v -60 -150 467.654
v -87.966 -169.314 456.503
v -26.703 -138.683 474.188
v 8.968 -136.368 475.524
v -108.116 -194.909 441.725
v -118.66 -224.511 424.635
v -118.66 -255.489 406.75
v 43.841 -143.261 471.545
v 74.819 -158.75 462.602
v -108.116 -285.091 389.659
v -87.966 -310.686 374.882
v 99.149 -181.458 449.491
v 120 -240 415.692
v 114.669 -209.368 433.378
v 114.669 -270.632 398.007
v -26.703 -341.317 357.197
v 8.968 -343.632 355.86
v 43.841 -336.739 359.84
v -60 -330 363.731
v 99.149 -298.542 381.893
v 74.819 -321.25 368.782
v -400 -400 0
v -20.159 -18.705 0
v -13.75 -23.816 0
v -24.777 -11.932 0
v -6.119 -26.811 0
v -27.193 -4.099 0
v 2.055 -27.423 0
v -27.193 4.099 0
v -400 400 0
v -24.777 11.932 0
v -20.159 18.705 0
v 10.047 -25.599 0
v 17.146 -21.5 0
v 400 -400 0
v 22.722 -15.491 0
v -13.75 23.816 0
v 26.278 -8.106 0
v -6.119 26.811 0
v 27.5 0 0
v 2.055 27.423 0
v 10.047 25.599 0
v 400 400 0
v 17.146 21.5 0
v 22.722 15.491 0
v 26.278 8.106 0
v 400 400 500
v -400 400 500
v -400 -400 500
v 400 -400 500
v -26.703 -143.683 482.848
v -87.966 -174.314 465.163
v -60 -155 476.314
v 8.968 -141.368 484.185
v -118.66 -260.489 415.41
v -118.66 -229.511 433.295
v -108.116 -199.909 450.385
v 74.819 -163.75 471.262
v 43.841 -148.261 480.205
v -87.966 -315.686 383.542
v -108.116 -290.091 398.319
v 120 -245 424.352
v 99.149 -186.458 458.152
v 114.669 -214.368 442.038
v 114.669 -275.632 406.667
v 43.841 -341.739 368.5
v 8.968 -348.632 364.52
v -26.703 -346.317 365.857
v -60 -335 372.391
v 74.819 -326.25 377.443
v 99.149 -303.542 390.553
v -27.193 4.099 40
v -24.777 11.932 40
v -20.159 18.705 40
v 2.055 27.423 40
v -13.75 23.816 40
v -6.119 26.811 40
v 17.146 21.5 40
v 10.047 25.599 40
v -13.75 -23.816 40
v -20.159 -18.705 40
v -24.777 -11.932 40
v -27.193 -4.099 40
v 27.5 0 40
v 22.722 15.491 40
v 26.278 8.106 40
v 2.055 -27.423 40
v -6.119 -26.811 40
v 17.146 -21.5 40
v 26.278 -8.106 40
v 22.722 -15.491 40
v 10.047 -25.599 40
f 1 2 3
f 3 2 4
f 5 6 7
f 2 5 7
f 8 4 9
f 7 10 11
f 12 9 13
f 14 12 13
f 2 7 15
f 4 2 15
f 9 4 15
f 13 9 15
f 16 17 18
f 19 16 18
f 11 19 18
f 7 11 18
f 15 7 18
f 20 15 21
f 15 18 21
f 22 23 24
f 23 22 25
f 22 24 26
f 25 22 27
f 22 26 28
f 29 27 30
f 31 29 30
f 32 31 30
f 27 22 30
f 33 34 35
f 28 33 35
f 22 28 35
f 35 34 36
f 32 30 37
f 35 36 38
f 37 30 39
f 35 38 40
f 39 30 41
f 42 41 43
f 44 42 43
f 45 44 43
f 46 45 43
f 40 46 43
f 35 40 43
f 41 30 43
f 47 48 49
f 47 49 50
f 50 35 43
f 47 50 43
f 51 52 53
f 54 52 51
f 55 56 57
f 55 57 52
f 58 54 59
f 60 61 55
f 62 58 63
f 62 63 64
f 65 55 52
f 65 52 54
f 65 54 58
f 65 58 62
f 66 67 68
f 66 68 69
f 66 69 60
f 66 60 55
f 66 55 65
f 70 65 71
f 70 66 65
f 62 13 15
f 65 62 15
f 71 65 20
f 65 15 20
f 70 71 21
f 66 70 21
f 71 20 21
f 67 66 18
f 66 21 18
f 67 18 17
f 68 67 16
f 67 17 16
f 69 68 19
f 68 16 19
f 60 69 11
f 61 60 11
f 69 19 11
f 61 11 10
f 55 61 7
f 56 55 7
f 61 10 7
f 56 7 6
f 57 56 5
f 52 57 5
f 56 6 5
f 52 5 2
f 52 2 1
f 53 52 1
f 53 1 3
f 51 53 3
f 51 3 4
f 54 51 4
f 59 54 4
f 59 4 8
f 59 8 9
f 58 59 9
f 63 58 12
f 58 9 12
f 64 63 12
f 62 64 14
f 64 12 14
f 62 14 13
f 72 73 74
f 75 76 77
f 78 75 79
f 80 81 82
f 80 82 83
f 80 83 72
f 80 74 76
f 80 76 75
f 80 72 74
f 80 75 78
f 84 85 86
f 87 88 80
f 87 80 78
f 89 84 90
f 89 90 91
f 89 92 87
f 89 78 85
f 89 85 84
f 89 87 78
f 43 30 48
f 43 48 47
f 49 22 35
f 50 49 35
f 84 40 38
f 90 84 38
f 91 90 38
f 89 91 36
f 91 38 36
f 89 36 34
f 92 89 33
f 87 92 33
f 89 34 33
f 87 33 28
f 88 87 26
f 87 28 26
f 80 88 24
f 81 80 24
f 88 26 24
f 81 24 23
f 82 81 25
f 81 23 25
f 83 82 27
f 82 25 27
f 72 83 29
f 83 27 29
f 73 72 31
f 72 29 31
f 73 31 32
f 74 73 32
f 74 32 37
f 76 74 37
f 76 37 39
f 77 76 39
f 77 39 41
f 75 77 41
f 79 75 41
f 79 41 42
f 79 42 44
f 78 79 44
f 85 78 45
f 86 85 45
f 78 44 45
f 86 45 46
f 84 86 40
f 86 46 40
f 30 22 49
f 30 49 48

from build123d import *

# Parameters (mm, degrees)
F0_W     = 800
F0_H     = 800
F1_DEPTH = 500
F2_R     = 27.5
F3_DEPTH = 40
F7_R     = 120
F8_DEPTH = 10


with BuildPart() as f1:
    # F0 (on Top) → F1 (new body)
    with BuildSketch(Plane.XY):
        Rectangle(F0_W, F0_H)
    extrude(amount=F1_DEPTH)

    # F2 (on face) → F3 (cut)
    with BuildSketch(Plane(origin=(0, 0, 0), x_dir=(1, 0, 0), z_dir=(0, 0, -1))):
        Circle(F2_R)
    extrude(amount=-F3_DEPTH, mode=Mode.SUBTRACT)

    # F7 (on offset) → F8 (cut)
    with BuildSketch(Plane(origin=(0, -240, 415.6921938165), x_dir=(1, 0, 0), z_dir=(0, 0.5, -0.8660254038))):
        Circle(F7_R)
    extrude(amount=-F8_DEPTH, mode=Mode.SUBTRACT)


solid = f1.part
